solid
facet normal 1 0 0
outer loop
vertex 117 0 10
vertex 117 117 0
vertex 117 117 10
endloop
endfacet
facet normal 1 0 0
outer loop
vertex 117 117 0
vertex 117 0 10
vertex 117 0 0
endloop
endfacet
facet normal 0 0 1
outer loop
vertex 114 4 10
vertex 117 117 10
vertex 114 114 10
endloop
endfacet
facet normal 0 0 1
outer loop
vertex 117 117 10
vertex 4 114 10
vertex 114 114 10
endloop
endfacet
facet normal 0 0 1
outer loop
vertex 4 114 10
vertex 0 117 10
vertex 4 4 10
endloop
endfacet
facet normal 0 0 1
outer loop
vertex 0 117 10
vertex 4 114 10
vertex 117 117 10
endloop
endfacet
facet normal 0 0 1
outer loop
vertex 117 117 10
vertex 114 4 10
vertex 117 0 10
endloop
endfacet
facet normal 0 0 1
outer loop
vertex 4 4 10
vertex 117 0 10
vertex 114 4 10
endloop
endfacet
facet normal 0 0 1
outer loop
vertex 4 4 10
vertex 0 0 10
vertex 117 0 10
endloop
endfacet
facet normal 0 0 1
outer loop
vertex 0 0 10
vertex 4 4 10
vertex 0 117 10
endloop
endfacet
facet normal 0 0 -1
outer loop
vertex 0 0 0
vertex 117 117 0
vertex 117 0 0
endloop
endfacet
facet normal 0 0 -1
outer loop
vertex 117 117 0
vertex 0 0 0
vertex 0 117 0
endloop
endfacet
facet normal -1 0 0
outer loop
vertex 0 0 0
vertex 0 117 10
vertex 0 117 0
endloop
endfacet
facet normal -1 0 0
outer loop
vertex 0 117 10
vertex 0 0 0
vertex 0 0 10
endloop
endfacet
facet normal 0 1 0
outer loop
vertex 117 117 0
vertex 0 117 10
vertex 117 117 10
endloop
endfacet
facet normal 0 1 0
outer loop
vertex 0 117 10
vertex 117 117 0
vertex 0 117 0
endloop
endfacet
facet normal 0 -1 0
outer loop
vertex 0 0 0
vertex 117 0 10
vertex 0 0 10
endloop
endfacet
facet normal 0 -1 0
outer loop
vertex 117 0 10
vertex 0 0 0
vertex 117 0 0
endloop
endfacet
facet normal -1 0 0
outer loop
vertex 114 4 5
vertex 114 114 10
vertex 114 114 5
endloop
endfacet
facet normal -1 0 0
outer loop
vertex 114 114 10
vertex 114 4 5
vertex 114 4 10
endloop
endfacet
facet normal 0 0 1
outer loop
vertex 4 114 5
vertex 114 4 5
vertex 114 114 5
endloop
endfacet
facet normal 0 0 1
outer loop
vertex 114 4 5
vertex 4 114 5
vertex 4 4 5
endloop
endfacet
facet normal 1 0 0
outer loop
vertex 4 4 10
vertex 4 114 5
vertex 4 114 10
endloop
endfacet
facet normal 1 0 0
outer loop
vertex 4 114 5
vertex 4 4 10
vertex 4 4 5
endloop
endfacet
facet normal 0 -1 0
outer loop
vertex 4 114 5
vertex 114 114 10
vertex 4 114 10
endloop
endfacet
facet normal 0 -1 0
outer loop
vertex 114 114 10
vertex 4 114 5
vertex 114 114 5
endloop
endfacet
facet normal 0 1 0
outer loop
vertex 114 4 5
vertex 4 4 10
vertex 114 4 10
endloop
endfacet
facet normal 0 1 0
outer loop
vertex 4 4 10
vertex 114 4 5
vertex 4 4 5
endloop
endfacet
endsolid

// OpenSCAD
$fn=64;
difference(){cube(size = [117, 117, 10]);
color("red"){translate(v = [4, 4, 5])
cube(size = [110, 110, 10]);
}
}
